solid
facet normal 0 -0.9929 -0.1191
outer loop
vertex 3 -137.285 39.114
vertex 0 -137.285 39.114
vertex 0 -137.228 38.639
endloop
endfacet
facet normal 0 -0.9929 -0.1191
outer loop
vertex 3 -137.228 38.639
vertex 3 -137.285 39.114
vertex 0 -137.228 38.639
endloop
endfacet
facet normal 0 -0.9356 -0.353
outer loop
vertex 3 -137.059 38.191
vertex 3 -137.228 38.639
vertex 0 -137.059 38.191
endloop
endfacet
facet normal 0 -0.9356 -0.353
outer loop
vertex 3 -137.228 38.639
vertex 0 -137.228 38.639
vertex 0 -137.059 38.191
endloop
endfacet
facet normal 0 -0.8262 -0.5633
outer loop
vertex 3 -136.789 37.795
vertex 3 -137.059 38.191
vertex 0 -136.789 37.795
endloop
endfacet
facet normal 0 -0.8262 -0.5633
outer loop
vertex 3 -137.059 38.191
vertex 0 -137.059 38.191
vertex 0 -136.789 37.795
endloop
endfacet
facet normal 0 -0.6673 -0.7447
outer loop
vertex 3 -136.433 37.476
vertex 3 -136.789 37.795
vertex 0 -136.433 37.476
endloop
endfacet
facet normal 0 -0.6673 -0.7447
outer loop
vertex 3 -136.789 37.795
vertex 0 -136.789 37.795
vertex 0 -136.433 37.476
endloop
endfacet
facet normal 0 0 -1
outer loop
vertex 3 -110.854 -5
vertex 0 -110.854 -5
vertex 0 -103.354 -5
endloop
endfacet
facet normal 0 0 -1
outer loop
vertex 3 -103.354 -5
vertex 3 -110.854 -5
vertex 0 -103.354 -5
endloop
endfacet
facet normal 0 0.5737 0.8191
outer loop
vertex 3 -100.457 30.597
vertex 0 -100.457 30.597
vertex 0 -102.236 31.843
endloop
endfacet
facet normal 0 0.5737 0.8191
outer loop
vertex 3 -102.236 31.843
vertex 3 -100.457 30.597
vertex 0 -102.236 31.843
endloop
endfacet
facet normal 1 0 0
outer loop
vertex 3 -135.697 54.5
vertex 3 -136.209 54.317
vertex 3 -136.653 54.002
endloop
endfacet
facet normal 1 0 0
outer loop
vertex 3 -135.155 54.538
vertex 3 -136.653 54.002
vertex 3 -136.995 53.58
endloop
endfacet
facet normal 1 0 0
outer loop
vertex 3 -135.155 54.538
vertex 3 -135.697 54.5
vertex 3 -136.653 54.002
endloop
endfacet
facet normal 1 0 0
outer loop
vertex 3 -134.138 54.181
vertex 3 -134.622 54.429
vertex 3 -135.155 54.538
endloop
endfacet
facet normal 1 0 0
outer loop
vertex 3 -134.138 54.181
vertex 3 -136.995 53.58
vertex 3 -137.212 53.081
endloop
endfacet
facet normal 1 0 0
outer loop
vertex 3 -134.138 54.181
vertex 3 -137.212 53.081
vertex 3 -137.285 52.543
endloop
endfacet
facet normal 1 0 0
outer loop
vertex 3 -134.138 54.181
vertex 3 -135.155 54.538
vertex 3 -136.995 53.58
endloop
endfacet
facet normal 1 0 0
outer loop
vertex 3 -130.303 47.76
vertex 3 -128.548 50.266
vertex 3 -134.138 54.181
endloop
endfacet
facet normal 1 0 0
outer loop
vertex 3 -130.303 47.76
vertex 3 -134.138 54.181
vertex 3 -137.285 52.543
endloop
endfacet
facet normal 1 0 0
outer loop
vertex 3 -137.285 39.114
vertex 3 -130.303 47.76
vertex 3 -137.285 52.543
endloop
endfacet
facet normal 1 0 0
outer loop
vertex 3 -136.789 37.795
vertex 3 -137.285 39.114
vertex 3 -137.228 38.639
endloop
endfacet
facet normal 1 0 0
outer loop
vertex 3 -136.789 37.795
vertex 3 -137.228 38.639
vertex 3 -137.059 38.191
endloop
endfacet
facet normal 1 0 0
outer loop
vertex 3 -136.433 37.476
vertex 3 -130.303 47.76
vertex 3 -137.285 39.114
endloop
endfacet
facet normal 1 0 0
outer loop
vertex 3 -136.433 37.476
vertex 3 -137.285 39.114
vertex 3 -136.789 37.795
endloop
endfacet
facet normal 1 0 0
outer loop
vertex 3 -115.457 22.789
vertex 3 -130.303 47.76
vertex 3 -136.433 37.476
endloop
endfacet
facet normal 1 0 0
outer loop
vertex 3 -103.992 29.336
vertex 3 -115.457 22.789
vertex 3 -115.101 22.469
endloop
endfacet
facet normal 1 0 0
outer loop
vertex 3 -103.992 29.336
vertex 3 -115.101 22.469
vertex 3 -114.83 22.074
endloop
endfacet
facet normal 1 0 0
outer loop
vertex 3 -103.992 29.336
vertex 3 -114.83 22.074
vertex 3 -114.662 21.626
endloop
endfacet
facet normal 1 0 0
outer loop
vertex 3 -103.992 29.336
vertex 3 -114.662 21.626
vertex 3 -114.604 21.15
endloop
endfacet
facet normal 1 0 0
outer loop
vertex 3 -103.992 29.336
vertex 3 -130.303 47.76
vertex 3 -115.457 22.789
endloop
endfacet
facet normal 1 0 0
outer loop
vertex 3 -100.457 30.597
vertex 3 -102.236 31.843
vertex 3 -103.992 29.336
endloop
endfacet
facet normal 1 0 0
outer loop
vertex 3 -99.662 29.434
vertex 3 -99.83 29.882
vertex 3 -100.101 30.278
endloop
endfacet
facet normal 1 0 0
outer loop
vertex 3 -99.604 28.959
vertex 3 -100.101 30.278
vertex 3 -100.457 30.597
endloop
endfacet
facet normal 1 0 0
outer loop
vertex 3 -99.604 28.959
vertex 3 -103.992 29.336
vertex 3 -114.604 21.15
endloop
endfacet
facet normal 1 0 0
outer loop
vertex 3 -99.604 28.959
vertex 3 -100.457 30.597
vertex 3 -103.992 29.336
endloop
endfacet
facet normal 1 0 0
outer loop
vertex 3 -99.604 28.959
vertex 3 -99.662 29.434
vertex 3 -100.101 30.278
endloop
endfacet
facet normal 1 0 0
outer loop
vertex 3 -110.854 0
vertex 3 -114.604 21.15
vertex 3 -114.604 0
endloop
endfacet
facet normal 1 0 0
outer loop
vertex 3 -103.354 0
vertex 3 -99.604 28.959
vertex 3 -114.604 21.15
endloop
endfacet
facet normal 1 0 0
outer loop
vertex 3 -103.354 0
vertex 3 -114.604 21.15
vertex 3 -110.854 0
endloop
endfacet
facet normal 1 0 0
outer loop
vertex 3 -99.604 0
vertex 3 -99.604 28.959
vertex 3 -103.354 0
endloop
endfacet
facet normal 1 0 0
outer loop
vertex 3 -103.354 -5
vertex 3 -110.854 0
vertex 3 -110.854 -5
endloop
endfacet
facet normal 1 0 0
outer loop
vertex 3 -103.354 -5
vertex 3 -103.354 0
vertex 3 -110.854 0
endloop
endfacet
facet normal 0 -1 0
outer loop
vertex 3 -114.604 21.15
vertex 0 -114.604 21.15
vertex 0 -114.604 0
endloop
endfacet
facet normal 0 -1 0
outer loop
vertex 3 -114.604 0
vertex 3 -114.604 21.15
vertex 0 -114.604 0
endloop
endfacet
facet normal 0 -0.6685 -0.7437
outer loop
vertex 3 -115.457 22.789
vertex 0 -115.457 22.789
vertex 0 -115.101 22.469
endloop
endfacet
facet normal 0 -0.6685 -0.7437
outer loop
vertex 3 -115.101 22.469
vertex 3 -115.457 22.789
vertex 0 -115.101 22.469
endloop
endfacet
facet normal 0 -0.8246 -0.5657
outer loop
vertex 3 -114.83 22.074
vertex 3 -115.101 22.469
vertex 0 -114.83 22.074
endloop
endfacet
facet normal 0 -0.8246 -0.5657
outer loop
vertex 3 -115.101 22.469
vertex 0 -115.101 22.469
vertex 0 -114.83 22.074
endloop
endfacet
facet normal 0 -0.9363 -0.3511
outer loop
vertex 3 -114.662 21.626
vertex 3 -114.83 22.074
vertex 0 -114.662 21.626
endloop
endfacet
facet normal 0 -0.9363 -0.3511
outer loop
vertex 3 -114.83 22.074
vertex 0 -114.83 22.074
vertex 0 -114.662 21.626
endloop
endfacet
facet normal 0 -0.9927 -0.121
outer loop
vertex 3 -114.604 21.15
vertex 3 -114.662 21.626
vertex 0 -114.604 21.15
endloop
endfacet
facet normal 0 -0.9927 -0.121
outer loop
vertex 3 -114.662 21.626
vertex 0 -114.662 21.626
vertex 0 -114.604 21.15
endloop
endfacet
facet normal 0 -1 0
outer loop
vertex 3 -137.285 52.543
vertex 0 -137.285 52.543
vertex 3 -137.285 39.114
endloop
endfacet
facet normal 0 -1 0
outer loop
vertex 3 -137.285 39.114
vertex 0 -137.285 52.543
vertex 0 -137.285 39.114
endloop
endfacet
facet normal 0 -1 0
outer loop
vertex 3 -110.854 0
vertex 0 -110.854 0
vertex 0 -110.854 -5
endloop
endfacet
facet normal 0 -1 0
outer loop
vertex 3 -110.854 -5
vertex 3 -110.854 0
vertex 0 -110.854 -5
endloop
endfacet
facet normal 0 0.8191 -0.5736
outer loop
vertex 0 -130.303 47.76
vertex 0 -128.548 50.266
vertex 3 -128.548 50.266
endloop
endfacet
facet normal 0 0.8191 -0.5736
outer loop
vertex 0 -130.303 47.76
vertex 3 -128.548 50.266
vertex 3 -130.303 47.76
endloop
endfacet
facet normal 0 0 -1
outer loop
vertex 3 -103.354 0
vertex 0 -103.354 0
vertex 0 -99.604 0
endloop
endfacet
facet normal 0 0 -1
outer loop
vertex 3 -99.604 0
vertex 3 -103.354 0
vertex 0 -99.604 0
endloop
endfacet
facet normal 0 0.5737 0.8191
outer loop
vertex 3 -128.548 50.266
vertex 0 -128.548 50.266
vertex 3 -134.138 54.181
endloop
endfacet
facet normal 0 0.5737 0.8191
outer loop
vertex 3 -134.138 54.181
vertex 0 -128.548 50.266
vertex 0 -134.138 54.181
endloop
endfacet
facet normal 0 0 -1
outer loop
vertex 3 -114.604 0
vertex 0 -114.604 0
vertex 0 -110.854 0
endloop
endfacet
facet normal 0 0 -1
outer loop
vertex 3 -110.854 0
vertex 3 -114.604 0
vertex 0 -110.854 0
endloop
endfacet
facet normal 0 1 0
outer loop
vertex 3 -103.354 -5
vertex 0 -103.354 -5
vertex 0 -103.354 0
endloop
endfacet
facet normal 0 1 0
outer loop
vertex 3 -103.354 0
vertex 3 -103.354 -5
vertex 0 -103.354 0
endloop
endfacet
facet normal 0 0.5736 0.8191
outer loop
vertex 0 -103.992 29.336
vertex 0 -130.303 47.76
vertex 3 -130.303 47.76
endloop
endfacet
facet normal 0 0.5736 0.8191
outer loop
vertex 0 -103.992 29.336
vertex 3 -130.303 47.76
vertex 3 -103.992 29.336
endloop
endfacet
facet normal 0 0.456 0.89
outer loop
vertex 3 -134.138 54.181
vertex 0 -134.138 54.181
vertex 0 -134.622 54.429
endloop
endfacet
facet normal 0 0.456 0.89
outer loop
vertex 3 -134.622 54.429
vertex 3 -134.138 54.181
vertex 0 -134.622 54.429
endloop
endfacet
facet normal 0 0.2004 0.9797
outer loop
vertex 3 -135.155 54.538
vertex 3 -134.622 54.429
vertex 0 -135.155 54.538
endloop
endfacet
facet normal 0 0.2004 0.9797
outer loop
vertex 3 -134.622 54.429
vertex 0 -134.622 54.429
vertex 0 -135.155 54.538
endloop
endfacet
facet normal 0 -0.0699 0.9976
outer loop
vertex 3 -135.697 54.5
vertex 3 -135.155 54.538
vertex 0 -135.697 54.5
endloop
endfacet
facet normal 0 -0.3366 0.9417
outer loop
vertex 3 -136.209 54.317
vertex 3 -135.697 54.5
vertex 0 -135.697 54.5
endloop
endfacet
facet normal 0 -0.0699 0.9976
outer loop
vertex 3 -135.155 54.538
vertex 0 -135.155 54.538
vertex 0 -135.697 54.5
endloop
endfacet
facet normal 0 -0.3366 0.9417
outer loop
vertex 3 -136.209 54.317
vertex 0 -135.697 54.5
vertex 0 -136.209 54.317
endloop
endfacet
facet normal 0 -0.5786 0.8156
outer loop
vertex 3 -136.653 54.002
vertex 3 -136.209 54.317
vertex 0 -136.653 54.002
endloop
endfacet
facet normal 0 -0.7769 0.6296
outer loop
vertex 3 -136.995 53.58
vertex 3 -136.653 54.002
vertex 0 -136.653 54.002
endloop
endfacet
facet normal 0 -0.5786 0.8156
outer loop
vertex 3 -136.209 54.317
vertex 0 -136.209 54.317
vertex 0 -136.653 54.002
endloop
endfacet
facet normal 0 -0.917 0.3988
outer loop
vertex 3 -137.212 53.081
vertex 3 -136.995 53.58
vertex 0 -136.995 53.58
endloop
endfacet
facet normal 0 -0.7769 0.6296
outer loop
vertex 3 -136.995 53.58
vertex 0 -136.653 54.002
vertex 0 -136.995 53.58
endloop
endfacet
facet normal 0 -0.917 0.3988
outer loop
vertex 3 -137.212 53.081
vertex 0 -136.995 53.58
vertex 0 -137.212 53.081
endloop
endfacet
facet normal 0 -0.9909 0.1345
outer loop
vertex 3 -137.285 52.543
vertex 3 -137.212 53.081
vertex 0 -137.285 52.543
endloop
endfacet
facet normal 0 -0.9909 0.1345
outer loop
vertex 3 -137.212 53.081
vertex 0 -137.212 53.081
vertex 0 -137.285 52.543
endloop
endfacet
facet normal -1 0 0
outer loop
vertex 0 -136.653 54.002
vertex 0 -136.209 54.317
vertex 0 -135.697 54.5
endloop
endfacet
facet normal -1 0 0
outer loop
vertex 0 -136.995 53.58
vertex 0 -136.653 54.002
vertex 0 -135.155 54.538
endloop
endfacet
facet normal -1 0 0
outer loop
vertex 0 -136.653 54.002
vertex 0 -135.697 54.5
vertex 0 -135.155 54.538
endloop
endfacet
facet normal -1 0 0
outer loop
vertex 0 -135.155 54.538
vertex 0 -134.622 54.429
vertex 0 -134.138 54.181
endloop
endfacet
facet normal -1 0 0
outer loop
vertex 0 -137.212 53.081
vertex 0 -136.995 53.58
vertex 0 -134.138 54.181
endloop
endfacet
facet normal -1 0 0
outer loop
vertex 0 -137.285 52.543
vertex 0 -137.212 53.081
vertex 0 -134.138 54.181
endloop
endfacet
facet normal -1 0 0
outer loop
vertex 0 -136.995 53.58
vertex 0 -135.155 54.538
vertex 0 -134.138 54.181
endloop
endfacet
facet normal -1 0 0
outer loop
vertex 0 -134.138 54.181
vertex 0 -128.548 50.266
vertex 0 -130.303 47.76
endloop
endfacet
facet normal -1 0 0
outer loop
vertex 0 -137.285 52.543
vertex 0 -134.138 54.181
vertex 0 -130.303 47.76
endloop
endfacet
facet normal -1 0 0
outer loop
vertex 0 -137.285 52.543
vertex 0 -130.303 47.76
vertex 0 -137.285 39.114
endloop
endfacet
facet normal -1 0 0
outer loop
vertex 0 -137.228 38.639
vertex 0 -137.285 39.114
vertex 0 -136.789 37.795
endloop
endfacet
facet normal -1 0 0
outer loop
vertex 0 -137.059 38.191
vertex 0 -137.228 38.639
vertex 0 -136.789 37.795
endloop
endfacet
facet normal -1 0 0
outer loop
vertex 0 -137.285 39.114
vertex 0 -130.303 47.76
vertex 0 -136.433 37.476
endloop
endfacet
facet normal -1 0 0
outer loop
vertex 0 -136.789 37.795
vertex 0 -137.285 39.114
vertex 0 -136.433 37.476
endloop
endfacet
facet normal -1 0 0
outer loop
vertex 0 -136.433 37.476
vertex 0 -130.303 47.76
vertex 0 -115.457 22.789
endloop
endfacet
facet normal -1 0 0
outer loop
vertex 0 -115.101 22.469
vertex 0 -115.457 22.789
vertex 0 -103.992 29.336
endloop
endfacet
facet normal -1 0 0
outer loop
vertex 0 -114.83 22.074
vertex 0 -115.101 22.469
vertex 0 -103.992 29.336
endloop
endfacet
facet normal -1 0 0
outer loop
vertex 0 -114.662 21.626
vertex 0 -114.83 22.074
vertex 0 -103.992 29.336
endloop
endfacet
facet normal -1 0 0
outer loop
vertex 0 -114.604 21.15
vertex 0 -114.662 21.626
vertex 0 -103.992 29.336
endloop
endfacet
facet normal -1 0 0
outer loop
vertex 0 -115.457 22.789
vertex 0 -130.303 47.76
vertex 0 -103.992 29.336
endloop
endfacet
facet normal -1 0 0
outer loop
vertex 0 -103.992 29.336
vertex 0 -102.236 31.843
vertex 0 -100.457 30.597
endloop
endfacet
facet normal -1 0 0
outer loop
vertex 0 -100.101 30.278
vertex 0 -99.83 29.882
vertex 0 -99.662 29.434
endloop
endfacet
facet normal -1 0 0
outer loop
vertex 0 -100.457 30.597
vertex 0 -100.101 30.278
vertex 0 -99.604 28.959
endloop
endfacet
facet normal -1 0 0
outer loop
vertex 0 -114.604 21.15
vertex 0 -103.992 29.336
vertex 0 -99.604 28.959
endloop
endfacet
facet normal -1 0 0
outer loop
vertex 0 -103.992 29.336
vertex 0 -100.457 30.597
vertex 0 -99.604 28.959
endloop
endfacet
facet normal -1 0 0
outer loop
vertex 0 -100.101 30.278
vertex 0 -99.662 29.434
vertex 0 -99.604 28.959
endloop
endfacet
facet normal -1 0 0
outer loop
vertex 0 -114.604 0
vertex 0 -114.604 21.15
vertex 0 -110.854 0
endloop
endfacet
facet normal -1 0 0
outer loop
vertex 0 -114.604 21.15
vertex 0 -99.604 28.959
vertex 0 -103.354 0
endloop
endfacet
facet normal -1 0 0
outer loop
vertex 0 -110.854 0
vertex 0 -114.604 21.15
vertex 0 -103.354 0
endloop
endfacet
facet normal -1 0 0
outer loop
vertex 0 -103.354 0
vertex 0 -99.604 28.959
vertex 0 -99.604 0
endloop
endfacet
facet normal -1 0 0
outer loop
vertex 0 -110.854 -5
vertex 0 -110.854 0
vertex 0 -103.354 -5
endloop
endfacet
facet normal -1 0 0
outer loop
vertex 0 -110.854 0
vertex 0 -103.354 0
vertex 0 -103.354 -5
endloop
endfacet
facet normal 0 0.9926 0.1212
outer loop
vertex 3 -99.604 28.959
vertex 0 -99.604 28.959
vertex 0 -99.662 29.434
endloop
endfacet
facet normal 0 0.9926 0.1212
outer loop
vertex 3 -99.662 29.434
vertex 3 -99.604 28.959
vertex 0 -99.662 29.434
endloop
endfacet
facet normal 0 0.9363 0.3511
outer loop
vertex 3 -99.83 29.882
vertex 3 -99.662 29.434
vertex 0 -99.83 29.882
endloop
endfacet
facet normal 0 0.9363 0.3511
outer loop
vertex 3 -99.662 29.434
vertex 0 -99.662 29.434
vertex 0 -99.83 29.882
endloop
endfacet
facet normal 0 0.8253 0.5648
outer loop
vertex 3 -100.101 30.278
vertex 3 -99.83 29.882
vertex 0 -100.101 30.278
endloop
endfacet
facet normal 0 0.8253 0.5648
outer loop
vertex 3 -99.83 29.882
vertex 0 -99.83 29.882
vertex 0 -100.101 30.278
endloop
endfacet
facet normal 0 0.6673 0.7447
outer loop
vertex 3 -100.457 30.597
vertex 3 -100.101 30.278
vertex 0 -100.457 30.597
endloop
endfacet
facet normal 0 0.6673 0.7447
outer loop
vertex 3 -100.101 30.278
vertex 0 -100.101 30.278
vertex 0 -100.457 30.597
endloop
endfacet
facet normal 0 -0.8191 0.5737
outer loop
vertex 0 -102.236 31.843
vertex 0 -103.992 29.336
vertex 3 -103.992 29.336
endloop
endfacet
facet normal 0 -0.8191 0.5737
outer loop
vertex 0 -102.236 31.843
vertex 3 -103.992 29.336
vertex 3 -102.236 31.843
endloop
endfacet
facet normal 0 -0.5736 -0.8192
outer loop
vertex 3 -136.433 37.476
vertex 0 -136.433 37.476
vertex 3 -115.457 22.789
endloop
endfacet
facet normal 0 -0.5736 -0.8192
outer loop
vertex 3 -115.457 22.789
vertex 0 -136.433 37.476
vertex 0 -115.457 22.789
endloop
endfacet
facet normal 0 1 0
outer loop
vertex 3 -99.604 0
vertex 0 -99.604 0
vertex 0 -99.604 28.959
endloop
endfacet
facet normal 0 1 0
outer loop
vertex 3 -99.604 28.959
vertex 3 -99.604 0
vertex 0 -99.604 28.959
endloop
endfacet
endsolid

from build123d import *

# Parameters (mm, degrees)
BOSS_EXTRUDE1_DEPTH = 3
CUT_EXTRUDE1_DEPTH  = 3


with BuildPart() as part:
    # Sketch2 → Boss-Extrude1 (new body)
    with BuildSketch(Plane(origin=(0, 0, 0), x_dir=(0, 0, -1), z_dir=(1, 0, 0))):
        with BuildLine():
            Line((0, -99.604434048), (-28.958865899, -99.604434048))
            ThreePointArc((-28.958865899, -99.604434048), (-29.882363125, -99.830412381), (-30.597169987, -100.457281175))
            Line((-30.597169987, -100.457281175), (-54.180855907, -134.138275212))
            ThreePointArc((-54.180855907, -134.138275212), (-54.316573485, -136.208925312), (-52.542551818, -137.285428085))
            Line((-52.542551818, -137.285428085), (-39.114031342, -137.285428085))
            ThreePointArc((-39.114031342, -137.285428085), (-38.190534115, -137.059449751), (-37.475727253, -136.432580958))
            Line((-37.475727253, -136.432580958), (-22.788664229, -115.457281175))
            ThreePointArc((-22.788664229, -115.457281175), (-22.073857367, -114.830412381), (-21.150360141, -114.604434048))
            Line((-21.150360141, -114.604434048), (0, -114.604434048))
            Line((0, -114.604434048), (0, -110.854434048))
            Line((0, -110.854434048), (5, -110.854434048))
            Line((5, -110.854434048), (5, -103.354434048))
            Line((5, -103.354434048), (0, -103.354434048))
            Line((0, -103.354434048), (0, -99.604434048))
        make_face()
    extrude(amount=BOSS_EXTRUDE1_DEPTH)

    # Sketch3 → Cut-Extrude1 (cut)
    with BuildSketch(Plane.ZY):
        Polygon((50.2661846, -128.547545189), (47.759579345, -130.302689084), (29.336304209, -103.991525421), (31.842909464, -102.236381526), align=None)
    extrude(amount=-CUT_EXTRUDE1_DEPTH, mode=Mode.SUBTRACT)


solid = part.part
